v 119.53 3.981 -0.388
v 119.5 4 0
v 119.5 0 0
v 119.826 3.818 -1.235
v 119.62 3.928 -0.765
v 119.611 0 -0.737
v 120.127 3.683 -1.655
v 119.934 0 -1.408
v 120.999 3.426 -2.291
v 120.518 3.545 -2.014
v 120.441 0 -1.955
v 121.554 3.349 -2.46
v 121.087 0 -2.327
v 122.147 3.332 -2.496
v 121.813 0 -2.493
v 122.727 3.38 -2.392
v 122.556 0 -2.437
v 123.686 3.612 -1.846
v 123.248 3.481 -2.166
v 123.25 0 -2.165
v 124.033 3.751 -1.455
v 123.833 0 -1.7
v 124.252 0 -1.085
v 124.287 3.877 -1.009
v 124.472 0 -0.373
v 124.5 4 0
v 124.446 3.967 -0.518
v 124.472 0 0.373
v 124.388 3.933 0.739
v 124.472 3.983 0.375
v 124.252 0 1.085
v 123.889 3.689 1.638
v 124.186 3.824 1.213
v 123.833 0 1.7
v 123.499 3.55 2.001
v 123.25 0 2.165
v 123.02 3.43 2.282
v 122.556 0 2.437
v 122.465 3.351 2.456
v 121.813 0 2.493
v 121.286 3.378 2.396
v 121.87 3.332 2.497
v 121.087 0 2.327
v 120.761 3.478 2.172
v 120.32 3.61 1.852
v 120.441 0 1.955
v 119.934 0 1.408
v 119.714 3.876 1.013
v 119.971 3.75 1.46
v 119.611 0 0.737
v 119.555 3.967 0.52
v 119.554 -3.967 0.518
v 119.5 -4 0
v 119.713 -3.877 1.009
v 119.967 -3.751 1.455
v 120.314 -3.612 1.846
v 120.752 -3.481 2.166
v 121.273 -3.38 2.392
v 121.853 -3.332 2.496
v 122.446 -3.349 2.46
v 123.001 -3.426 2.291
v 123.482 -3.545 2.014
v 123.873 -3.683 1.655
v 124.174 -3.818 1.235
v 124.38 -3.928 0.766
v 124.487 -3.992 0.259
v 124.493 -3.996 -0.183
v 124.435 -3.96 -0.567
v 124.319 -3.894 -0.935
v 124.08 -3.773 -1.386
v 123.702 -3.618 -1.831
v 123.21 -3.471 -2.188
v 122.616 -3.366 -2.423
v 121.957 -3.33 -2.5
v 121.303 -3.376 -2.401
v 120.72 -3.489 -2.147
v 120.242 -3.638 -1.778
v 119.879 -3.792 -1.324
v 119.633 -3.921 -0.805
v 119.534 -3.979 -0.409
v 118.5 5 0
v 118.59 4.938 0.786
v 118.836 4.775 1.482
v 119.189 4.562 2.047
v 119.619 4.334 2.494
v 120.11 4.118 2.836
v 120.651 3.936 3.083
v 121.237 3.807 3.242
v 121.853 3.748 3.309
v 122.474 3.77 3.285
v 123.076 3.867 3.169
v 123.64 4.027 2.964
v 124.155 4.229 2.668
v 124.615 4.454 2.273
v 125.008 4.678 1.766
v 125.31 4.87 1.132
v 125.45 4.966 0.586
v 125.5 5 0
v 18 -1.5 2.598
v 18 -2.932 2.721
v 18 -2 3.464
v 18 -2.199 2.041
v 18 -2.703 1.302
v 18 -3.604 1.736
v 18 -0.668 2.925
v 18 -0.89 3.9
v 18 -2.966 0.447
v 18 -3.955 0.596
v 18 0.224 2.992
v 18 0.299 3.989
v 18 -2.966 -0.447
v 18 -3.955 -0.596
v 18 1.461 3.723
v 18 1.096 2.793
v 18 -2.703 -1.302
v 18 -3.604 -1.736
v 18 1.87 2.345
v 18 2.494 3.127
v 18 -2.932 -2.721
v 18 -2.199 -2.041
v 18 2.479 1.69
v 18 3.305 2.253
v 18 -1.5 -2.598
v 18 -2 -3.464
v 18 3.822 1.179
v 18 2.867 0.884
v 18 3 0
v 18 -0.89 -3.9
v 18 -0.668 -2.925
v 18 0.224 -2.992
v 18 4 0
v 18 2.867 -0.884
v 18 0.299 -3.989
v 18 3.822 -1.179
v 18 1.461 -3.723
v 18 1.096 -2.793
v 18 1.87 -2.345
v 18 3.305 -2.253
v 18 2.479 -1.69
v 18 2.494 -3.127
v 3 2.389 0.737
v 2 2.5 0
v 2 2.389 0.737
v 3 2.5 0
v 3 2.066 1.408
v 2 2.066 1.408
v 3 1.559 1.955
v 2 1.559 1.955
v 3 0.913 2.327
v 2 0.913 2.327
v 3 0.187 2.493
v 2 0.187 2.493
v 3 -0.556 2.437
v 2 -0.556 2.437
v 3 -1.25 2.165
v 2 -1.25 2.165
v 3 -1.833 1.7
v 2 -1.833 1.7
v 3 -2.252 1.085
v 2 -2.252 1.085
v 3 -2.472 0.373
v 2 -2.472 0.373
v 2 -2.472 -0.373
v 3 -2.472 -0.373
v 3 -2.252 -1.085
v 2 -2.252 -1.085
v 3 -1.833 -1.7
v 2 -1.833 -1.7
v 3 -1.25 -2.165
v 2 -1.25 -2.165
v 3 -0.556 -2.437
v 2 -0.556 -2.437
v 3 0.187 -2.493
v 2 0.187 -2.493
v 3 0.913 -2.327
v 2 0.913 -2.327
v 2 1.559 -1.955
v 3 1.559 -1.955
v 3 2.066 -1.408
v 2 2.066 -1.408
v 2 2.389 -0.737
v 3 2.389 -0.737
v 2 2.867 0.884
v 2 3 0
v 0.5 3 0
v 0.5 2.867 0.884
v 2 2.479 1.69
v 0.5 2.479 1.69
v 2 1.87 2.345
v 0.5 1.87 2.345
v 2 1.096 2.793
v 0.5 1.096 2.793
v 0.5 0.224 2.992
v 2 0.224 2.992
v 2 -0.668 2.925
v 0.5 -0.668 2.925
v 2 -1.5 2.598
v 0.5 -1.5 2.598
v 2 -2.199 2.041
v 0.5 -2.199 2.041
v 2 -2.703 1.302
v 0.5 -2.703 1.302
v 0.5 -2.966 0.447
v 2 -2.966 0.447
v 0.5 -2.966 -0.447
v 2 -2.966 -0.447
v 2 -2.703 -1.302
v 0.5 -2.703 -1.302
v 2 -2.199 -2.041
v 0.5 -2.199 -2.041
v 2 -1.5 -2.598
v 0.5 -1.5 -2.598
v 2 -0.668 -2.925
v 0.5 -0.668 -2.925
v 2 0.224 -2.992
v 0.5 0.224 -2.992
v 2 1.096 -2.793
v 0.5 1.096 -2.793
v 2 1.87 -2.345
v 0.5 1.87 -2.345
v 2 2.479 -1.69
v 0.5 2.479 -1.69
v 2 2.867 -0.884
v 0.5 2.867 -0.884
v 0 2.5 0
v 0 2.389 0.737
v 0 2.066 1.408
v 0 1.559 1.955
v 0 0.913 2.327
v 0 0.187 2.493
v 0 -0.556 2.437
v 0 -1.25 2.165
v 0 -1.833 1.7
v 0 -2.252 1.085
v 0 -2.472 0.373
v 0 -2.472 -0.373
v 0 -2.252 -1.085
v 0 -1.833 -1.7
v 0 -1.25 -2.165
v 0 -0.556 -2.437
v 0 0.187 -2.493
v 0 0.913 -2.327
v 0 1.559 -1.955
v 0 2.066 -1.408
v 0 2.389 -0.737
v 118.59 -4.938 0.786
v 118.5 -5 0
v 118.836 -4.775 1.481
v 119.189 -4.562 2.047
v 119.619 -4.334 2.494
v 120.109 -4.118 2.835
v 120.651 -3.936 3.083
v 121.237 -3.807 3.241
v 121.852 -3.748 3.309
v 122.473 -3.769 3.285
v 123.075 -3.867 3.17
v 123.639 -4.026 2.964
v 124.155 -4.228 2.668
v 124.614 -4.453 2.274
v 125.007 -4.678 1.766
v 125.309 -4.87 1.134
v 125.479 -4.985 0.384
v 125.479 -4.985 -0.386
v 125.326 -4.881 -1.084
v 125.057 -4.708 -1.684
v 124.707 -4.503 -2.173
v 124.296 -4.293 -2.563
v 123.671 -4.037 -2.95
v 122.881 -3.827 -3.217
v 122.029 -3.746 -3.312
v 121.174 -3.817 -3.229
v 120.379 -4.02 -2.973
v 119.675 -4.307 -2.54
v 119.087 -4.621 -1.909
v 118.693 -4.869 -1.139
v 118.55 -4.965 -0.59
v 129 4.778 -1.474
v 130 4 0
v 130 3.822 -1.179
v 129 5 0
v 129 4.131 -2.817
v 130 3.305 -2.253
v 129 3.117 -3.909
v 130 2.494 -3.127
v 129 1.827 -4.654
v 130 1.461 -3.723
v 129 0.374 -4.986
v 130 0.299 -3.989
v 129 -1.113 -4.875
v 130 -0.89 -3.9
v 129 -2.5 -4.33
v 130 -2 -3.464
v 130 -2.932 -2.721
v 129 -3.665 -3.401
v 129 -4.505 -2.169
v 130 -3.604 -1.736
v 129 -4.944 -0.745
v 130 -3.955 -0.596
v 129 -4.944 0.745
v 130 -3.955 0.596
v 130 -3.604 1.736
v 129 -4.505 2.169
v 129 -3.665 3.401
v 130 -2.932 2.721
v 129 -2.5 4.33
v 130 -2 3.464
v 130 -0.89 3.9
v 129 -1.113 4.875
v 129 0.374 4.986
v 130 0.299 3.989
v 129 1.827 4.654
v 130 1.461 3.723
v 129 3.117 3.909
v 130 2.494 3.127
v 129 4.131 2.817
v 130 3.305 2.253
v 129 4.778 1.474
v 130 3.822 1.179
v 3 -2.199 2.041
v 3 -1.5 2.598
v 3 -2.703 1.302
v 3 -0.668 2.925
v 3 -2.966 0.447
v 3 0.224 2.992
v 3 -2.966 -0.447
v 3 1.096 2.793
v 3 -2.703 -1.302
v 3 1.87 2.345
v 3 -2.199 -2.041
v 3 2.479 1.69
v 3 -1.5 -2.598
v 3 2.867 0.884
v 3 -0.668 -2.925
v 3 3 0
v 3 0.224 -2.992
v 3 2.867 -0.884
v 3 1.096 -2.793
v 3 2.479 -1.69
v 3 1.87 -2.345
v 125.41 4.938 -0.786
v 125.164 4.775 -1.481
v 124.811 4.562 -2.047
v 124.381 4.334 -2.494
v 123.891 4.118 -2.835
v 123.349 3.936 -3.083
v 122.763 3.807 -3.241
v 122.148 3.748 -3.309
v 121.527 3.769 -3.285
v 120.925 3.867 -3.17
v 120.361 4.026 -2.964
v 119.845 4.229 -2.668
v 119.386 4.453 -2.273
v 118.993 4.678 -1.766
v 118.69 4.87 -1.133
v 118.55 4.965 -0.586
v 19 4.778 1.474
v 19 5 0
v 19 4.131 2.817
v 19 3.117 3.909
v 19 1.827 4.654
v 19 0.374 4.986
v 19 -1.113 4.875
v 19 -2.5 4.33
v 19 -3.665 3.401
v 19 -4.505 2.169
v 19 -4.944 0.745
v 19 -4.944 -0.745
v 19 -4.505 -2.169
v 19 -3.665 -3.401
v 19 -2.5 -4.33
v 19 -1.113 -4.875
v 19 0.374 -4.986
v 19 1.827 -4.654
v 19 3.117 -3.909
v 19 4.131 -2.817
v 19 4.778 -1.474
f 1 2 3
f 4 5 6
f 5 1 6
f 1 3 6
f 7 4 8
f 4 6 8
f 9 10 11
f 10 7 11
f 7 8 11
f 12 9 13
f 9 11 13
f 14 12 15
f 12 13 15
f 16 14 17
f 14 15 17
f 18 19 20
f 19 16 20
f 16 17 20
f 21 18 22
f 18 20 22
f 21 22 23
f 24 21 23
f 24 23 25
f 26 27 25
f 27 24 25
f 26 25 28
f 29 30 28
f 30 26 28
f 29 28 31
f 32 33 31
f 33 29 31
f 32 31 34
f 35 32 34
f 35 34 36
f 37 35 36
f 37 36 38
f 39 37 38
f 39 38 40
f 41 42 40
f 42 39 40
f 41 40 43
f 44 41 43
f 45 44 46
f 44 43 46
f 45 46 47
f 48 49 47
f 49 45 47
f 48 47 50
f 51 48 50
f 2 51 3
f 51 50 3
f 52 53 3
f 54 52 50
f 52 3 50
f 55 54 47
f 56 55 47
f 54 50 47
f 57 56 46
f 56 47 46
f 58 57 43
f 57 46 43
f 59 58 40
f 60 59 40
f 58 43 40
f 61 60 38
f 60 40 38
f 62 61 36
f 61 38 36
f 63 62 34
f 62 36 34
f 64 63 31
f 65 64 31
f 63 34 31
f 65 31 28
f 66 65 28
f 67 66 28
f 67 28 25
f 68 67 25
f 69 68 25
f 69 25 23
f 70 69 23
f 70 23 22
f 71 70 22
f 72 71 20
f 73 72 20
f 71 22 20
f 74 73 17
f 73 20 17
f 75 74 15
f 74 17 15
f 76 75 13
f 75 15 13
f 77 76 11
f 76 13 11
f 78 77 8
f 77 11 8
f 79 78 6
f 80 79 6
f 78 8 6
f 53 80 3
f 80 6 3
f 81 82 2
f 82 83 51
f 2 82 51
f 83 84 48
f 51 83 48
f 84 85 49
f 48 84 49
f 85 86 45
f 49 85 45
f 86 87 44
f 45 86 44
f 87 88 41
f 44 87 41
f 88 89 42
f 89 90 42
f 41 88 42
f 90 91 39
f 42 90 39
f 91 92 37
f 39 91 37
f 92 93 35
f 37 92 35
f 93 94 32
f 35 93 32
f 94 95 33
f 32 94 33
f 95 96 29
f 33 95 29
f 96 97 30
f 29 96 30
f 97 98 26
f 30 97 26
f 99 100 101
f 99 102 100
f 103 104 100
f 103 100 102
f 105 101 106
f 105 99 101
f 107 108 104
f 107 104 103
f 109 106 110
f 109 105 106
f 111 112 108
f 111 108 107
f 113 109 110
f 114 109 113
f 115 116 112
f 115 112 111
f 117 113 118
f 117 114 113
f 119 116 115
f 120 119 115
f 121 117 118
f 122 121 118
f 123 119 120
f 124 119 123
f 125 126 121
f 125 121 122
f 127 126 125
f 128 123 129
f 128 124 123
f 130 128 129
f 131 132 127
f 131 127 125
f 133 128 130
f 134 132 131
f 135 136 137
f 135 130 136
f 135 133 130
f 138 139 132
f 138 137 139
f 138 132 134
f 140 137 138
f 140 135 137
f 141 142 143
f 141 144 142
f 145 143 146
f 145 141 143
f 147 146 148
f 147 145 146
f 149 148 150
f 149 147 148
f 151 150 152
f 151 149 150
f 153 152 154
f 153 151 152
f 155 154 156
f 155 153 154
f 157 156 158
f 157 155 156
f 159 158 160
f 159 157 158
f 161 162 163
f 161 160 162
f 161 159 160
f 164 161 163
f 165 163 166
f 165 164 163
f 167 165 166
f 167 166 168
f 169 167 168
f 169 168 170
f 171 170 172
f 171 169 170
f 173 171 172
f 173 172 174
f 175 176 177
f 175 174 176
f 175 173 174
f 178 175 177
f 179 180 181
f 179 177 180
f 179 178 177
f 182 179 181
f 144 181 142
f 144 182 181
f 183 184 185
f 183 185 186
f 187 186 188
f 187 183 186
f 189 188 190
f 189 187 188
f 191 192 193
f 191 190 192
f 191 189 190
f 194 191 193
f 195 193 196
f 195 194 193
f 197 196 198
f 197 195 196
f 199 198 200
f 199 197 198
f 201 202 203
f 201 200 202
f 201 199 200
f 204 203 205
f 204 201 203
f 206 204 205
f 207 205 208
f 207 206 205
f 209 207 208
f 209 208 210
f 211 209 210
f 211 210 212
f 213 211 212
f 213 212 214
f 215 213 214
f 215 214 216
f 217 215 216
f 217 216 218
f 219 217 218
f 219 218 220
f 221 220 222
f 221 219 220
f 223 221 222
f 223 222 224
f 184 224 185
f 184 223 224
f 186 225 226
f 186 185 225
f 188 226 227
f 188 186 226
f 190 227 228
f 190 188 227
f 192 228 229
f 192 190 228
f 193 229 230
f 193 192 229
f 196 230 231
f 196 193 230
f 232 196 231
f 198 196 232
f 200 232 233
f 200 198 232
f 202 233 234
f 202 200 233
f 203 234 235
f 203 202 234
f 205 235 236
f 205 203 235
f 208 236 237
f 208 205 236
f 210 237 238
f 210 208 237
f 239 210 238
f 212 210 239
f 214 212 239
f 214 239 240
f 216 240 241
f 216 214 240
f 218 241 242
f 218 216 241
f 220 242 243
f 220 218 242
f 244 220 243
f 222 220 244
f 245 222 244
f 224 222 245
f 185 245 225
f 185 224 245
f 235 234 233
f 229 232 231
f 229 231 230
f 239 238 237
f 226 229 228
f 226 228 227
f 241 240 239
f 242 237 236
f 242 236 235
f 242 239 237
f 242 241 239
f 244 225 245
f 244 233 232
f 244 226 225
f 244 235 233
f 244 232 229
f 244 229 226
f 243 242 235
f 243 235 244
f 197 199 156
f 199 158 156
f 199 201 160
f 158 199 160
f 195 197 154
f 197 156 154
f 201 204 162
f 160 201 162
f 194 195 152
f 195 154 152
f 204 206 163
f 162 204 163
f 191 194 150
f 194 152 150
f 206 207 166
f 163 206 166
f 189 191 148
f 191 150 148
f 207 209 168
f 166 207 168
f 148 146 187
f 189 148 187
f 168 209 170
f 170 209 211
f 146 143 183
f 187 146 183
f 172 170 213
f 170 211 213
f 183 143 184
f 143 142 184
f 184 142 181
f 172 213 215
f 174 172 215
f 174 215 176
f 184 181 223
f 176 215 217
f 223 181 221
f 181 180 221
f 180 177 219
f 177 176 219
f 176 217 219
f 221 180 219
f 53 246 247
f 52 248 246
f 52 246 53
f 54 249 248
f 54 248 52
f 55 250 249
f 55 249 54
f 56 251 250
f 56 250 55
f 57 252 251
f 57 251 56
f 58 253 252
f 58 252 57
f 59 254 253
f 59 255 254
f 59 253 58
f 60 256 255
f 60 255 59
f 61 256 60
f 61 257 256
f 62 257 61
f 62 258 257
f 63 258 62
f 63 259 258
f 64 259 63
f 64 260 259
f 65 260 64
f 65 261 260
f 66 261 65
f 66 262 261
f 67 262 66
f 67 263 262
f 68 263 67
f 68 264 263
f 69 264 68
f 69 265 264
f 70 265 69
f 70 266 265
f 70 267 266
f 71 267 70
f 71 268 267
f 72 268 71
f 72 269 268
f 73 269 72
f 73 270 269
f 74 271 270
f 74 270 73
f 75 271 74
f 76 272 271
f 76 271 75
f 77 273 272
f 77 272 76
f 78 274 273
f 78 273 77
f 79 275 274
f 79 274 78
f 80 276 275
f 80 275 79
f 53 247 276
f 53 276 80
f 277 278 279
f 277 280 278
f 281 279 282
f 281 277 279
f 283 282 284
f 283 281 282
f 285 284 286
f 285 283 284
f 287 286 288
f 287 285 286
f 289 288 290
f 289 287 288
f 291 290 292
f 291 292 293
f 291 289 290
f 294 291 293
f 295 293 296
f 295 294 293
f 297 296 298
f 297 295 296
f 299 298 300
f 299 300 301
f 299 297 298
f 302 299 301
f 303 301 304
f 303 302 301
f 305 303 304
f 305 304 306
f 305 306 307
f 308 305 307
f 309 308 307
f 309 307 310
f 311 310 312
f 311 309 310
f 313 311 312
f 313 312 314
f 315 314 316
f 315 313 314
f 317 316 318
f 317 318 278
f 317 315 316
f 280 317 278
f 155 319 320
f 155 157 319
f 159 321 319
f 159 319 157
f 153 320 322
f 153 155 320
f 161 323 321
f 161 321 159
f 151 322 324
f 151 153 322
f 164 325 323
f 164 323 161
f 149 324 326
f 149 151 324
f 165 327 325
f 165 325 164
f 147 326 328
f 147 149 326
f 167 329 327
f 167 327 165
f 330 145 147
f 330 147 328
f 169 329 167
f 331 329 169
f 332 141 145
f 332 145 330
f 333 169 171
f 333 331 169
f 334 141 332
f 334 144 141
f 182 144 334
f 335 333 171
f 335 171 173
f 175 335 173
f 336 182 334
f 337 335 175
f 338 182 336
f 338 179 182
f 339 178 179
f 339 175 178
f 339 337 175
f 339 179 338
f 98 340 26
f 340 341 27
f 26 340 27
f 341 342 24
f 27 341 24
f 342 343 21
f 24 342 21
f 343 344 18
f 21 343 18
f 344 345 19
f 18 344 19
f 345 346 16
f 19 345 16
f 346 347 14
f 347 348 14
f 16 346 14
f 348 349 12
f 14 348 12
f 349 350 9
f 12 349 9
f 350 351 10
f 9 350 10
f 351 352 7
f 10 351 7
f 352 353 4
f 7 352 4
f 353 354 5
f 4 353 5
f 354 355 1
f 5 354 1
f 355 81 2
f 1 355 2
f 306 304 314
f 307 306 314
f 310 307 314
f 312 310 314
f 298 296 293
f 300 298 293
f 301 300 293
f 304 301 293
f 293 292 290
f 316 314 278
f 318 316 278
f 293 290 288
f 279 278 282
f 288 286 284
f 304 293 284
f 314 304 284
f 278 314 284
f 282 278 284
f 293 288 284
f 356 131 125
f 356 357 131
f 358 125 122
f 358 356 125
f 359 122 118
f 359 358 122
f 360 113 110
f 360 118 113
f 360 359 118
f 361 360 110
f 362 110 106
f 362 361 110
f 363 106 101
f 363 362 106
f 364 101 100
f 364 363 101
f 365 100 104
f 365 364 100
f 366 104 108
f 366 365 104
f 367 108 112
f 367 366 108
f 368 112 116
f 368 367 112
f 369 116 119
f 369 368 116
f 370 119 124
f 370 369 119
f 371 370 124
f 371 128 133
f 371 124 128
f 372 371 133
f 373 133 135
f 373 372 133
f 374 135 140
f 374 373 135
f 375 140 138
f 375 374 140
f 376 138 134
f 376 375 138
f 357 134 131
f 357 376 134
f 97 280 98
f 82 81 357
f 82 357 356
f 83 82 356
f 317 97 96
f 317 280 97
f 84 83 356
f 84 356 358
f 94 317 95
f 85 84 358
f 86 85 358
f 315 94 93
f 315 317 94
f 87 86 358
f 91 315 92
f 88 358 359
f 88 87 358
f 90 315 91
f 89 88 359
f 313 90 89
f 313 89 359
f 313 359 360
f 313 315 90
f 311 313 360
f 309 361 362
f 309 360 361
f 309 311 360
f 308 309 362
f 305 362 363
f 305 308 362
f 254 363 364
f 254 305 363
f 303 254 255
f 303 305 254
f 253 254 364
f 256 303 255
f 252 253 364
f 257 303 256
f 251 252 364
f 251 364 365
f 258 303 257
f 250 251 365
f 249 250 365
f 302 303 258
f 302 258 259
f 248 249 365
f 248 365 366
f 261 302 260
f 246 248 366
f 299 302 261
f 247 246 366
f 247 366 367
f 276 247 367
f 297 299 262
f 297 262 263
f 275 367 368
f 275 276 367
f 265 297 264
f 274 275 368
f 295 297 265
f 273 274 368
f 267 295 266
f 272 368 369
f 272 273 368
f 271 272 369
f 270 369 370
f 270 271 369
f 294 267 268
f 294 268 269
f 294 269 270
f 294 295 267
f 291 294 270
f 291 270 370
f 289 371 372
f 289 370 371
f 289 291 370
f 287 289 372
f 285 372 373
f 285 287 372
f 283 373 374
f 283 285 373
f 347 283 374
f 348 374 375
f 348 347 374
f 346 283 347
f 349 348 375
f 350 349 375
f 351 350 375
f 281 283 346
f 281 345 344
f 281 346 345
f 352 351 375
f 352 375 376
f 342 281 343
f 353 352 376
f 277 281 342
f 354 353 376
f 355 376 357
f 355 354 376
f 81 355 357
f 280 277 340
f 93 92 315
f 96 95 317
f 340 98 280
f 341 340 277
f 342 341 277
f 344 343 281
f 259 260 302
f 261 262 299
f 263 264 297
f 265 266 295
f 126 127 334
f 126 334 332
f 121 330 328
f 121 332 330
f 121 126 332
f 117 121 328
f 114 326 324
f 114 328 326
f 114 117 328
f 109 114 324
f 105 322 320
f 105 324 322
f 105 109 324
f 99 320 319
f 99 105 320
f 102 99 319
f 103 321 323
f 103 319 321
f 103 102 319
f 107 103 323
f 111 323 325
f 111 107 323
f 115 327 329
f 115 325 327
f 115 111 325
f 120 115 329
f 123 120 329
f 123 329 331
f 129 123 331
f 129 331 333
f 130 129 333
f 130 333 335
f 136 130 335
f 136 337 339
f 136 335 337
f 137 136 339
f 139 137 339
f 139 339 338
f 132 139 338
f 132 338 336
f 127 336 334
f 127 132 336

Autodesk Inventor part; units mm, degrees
ref_plane "YZ Plane" through (0, 0, 0) normal (1, 0, 0) x (0, 1, 0)
ref_plane "XZ Plane" through (0, 0, 0) normal (0, 1, 0) x (-1, 0, 0)
ref_plane "XY Plane" through (0, 0, 0) normal (0, 0, 1) x (1, 0, 0)
sketch "Sketch1" plane through (0, 0, 0) normal (0, 0, 1) x (1, 0, 0)
  line L0 (0, 0) -> (0, 3)
  line L1 (0, 3) -> (2, 3)
  line L2 (2, 3) -> (2, 2.5)
  line L3 (2, 2.5) -> (3, 2.5)
  line L4 (3, 2.5) -> (3, 3)
  line L5 (3, 3) -> (18, 3)
  line L6 (18, 3) -> (18, 5)
  line L7 (18, 5) -> (130, 5)
  line L8 (130, 5) -> (130, 0)
  line L9 (130, 0) -> (0, 0)
  line L10 (122, 5) -> (122, 0)
  dimension "d0" = 1
  dimension "d2" = 3
  dimension "d3" = 6
  dimension "d4" = 5
  dimension "d5" = 130
  dimension "d6" = 18
  dimension "d7" = 10
  dimension "d8" = 8
revolve "Revolution1" add sketch "Sketch1" angle 360 about axis through (130, 0, 0) along (-1, 0, 0)
thread "Thread1" size "M10x1.5" class "6g" standard "ISO Metric profile" length 90
chamfer "Chamfer2" distance 0.5 angle 45 1 edges at (0, -3, 0)
sketch "Sketch2" plane through (0, 0, 0) normal (0, 1, 0) x (-1, 0, 0)
  circle A0 centre (-122, 0) radius 2.5
  point P0 (0, 0)
  dimension "d21" = 5
extrude "Extrusion1" cut sketch "Sketch2" along normal through all both and the other way through all
chamfer "Chamfer3" distance 1 angle 45 5 edges at (18, -5, 0) (130, -5, 0) (121.9995, 4.3301, -2.5) (122.0005, 4.3301, 2.5) (124.4999, -5, -0.0199)
properties part number "Rod" material "Stainless Steel"
